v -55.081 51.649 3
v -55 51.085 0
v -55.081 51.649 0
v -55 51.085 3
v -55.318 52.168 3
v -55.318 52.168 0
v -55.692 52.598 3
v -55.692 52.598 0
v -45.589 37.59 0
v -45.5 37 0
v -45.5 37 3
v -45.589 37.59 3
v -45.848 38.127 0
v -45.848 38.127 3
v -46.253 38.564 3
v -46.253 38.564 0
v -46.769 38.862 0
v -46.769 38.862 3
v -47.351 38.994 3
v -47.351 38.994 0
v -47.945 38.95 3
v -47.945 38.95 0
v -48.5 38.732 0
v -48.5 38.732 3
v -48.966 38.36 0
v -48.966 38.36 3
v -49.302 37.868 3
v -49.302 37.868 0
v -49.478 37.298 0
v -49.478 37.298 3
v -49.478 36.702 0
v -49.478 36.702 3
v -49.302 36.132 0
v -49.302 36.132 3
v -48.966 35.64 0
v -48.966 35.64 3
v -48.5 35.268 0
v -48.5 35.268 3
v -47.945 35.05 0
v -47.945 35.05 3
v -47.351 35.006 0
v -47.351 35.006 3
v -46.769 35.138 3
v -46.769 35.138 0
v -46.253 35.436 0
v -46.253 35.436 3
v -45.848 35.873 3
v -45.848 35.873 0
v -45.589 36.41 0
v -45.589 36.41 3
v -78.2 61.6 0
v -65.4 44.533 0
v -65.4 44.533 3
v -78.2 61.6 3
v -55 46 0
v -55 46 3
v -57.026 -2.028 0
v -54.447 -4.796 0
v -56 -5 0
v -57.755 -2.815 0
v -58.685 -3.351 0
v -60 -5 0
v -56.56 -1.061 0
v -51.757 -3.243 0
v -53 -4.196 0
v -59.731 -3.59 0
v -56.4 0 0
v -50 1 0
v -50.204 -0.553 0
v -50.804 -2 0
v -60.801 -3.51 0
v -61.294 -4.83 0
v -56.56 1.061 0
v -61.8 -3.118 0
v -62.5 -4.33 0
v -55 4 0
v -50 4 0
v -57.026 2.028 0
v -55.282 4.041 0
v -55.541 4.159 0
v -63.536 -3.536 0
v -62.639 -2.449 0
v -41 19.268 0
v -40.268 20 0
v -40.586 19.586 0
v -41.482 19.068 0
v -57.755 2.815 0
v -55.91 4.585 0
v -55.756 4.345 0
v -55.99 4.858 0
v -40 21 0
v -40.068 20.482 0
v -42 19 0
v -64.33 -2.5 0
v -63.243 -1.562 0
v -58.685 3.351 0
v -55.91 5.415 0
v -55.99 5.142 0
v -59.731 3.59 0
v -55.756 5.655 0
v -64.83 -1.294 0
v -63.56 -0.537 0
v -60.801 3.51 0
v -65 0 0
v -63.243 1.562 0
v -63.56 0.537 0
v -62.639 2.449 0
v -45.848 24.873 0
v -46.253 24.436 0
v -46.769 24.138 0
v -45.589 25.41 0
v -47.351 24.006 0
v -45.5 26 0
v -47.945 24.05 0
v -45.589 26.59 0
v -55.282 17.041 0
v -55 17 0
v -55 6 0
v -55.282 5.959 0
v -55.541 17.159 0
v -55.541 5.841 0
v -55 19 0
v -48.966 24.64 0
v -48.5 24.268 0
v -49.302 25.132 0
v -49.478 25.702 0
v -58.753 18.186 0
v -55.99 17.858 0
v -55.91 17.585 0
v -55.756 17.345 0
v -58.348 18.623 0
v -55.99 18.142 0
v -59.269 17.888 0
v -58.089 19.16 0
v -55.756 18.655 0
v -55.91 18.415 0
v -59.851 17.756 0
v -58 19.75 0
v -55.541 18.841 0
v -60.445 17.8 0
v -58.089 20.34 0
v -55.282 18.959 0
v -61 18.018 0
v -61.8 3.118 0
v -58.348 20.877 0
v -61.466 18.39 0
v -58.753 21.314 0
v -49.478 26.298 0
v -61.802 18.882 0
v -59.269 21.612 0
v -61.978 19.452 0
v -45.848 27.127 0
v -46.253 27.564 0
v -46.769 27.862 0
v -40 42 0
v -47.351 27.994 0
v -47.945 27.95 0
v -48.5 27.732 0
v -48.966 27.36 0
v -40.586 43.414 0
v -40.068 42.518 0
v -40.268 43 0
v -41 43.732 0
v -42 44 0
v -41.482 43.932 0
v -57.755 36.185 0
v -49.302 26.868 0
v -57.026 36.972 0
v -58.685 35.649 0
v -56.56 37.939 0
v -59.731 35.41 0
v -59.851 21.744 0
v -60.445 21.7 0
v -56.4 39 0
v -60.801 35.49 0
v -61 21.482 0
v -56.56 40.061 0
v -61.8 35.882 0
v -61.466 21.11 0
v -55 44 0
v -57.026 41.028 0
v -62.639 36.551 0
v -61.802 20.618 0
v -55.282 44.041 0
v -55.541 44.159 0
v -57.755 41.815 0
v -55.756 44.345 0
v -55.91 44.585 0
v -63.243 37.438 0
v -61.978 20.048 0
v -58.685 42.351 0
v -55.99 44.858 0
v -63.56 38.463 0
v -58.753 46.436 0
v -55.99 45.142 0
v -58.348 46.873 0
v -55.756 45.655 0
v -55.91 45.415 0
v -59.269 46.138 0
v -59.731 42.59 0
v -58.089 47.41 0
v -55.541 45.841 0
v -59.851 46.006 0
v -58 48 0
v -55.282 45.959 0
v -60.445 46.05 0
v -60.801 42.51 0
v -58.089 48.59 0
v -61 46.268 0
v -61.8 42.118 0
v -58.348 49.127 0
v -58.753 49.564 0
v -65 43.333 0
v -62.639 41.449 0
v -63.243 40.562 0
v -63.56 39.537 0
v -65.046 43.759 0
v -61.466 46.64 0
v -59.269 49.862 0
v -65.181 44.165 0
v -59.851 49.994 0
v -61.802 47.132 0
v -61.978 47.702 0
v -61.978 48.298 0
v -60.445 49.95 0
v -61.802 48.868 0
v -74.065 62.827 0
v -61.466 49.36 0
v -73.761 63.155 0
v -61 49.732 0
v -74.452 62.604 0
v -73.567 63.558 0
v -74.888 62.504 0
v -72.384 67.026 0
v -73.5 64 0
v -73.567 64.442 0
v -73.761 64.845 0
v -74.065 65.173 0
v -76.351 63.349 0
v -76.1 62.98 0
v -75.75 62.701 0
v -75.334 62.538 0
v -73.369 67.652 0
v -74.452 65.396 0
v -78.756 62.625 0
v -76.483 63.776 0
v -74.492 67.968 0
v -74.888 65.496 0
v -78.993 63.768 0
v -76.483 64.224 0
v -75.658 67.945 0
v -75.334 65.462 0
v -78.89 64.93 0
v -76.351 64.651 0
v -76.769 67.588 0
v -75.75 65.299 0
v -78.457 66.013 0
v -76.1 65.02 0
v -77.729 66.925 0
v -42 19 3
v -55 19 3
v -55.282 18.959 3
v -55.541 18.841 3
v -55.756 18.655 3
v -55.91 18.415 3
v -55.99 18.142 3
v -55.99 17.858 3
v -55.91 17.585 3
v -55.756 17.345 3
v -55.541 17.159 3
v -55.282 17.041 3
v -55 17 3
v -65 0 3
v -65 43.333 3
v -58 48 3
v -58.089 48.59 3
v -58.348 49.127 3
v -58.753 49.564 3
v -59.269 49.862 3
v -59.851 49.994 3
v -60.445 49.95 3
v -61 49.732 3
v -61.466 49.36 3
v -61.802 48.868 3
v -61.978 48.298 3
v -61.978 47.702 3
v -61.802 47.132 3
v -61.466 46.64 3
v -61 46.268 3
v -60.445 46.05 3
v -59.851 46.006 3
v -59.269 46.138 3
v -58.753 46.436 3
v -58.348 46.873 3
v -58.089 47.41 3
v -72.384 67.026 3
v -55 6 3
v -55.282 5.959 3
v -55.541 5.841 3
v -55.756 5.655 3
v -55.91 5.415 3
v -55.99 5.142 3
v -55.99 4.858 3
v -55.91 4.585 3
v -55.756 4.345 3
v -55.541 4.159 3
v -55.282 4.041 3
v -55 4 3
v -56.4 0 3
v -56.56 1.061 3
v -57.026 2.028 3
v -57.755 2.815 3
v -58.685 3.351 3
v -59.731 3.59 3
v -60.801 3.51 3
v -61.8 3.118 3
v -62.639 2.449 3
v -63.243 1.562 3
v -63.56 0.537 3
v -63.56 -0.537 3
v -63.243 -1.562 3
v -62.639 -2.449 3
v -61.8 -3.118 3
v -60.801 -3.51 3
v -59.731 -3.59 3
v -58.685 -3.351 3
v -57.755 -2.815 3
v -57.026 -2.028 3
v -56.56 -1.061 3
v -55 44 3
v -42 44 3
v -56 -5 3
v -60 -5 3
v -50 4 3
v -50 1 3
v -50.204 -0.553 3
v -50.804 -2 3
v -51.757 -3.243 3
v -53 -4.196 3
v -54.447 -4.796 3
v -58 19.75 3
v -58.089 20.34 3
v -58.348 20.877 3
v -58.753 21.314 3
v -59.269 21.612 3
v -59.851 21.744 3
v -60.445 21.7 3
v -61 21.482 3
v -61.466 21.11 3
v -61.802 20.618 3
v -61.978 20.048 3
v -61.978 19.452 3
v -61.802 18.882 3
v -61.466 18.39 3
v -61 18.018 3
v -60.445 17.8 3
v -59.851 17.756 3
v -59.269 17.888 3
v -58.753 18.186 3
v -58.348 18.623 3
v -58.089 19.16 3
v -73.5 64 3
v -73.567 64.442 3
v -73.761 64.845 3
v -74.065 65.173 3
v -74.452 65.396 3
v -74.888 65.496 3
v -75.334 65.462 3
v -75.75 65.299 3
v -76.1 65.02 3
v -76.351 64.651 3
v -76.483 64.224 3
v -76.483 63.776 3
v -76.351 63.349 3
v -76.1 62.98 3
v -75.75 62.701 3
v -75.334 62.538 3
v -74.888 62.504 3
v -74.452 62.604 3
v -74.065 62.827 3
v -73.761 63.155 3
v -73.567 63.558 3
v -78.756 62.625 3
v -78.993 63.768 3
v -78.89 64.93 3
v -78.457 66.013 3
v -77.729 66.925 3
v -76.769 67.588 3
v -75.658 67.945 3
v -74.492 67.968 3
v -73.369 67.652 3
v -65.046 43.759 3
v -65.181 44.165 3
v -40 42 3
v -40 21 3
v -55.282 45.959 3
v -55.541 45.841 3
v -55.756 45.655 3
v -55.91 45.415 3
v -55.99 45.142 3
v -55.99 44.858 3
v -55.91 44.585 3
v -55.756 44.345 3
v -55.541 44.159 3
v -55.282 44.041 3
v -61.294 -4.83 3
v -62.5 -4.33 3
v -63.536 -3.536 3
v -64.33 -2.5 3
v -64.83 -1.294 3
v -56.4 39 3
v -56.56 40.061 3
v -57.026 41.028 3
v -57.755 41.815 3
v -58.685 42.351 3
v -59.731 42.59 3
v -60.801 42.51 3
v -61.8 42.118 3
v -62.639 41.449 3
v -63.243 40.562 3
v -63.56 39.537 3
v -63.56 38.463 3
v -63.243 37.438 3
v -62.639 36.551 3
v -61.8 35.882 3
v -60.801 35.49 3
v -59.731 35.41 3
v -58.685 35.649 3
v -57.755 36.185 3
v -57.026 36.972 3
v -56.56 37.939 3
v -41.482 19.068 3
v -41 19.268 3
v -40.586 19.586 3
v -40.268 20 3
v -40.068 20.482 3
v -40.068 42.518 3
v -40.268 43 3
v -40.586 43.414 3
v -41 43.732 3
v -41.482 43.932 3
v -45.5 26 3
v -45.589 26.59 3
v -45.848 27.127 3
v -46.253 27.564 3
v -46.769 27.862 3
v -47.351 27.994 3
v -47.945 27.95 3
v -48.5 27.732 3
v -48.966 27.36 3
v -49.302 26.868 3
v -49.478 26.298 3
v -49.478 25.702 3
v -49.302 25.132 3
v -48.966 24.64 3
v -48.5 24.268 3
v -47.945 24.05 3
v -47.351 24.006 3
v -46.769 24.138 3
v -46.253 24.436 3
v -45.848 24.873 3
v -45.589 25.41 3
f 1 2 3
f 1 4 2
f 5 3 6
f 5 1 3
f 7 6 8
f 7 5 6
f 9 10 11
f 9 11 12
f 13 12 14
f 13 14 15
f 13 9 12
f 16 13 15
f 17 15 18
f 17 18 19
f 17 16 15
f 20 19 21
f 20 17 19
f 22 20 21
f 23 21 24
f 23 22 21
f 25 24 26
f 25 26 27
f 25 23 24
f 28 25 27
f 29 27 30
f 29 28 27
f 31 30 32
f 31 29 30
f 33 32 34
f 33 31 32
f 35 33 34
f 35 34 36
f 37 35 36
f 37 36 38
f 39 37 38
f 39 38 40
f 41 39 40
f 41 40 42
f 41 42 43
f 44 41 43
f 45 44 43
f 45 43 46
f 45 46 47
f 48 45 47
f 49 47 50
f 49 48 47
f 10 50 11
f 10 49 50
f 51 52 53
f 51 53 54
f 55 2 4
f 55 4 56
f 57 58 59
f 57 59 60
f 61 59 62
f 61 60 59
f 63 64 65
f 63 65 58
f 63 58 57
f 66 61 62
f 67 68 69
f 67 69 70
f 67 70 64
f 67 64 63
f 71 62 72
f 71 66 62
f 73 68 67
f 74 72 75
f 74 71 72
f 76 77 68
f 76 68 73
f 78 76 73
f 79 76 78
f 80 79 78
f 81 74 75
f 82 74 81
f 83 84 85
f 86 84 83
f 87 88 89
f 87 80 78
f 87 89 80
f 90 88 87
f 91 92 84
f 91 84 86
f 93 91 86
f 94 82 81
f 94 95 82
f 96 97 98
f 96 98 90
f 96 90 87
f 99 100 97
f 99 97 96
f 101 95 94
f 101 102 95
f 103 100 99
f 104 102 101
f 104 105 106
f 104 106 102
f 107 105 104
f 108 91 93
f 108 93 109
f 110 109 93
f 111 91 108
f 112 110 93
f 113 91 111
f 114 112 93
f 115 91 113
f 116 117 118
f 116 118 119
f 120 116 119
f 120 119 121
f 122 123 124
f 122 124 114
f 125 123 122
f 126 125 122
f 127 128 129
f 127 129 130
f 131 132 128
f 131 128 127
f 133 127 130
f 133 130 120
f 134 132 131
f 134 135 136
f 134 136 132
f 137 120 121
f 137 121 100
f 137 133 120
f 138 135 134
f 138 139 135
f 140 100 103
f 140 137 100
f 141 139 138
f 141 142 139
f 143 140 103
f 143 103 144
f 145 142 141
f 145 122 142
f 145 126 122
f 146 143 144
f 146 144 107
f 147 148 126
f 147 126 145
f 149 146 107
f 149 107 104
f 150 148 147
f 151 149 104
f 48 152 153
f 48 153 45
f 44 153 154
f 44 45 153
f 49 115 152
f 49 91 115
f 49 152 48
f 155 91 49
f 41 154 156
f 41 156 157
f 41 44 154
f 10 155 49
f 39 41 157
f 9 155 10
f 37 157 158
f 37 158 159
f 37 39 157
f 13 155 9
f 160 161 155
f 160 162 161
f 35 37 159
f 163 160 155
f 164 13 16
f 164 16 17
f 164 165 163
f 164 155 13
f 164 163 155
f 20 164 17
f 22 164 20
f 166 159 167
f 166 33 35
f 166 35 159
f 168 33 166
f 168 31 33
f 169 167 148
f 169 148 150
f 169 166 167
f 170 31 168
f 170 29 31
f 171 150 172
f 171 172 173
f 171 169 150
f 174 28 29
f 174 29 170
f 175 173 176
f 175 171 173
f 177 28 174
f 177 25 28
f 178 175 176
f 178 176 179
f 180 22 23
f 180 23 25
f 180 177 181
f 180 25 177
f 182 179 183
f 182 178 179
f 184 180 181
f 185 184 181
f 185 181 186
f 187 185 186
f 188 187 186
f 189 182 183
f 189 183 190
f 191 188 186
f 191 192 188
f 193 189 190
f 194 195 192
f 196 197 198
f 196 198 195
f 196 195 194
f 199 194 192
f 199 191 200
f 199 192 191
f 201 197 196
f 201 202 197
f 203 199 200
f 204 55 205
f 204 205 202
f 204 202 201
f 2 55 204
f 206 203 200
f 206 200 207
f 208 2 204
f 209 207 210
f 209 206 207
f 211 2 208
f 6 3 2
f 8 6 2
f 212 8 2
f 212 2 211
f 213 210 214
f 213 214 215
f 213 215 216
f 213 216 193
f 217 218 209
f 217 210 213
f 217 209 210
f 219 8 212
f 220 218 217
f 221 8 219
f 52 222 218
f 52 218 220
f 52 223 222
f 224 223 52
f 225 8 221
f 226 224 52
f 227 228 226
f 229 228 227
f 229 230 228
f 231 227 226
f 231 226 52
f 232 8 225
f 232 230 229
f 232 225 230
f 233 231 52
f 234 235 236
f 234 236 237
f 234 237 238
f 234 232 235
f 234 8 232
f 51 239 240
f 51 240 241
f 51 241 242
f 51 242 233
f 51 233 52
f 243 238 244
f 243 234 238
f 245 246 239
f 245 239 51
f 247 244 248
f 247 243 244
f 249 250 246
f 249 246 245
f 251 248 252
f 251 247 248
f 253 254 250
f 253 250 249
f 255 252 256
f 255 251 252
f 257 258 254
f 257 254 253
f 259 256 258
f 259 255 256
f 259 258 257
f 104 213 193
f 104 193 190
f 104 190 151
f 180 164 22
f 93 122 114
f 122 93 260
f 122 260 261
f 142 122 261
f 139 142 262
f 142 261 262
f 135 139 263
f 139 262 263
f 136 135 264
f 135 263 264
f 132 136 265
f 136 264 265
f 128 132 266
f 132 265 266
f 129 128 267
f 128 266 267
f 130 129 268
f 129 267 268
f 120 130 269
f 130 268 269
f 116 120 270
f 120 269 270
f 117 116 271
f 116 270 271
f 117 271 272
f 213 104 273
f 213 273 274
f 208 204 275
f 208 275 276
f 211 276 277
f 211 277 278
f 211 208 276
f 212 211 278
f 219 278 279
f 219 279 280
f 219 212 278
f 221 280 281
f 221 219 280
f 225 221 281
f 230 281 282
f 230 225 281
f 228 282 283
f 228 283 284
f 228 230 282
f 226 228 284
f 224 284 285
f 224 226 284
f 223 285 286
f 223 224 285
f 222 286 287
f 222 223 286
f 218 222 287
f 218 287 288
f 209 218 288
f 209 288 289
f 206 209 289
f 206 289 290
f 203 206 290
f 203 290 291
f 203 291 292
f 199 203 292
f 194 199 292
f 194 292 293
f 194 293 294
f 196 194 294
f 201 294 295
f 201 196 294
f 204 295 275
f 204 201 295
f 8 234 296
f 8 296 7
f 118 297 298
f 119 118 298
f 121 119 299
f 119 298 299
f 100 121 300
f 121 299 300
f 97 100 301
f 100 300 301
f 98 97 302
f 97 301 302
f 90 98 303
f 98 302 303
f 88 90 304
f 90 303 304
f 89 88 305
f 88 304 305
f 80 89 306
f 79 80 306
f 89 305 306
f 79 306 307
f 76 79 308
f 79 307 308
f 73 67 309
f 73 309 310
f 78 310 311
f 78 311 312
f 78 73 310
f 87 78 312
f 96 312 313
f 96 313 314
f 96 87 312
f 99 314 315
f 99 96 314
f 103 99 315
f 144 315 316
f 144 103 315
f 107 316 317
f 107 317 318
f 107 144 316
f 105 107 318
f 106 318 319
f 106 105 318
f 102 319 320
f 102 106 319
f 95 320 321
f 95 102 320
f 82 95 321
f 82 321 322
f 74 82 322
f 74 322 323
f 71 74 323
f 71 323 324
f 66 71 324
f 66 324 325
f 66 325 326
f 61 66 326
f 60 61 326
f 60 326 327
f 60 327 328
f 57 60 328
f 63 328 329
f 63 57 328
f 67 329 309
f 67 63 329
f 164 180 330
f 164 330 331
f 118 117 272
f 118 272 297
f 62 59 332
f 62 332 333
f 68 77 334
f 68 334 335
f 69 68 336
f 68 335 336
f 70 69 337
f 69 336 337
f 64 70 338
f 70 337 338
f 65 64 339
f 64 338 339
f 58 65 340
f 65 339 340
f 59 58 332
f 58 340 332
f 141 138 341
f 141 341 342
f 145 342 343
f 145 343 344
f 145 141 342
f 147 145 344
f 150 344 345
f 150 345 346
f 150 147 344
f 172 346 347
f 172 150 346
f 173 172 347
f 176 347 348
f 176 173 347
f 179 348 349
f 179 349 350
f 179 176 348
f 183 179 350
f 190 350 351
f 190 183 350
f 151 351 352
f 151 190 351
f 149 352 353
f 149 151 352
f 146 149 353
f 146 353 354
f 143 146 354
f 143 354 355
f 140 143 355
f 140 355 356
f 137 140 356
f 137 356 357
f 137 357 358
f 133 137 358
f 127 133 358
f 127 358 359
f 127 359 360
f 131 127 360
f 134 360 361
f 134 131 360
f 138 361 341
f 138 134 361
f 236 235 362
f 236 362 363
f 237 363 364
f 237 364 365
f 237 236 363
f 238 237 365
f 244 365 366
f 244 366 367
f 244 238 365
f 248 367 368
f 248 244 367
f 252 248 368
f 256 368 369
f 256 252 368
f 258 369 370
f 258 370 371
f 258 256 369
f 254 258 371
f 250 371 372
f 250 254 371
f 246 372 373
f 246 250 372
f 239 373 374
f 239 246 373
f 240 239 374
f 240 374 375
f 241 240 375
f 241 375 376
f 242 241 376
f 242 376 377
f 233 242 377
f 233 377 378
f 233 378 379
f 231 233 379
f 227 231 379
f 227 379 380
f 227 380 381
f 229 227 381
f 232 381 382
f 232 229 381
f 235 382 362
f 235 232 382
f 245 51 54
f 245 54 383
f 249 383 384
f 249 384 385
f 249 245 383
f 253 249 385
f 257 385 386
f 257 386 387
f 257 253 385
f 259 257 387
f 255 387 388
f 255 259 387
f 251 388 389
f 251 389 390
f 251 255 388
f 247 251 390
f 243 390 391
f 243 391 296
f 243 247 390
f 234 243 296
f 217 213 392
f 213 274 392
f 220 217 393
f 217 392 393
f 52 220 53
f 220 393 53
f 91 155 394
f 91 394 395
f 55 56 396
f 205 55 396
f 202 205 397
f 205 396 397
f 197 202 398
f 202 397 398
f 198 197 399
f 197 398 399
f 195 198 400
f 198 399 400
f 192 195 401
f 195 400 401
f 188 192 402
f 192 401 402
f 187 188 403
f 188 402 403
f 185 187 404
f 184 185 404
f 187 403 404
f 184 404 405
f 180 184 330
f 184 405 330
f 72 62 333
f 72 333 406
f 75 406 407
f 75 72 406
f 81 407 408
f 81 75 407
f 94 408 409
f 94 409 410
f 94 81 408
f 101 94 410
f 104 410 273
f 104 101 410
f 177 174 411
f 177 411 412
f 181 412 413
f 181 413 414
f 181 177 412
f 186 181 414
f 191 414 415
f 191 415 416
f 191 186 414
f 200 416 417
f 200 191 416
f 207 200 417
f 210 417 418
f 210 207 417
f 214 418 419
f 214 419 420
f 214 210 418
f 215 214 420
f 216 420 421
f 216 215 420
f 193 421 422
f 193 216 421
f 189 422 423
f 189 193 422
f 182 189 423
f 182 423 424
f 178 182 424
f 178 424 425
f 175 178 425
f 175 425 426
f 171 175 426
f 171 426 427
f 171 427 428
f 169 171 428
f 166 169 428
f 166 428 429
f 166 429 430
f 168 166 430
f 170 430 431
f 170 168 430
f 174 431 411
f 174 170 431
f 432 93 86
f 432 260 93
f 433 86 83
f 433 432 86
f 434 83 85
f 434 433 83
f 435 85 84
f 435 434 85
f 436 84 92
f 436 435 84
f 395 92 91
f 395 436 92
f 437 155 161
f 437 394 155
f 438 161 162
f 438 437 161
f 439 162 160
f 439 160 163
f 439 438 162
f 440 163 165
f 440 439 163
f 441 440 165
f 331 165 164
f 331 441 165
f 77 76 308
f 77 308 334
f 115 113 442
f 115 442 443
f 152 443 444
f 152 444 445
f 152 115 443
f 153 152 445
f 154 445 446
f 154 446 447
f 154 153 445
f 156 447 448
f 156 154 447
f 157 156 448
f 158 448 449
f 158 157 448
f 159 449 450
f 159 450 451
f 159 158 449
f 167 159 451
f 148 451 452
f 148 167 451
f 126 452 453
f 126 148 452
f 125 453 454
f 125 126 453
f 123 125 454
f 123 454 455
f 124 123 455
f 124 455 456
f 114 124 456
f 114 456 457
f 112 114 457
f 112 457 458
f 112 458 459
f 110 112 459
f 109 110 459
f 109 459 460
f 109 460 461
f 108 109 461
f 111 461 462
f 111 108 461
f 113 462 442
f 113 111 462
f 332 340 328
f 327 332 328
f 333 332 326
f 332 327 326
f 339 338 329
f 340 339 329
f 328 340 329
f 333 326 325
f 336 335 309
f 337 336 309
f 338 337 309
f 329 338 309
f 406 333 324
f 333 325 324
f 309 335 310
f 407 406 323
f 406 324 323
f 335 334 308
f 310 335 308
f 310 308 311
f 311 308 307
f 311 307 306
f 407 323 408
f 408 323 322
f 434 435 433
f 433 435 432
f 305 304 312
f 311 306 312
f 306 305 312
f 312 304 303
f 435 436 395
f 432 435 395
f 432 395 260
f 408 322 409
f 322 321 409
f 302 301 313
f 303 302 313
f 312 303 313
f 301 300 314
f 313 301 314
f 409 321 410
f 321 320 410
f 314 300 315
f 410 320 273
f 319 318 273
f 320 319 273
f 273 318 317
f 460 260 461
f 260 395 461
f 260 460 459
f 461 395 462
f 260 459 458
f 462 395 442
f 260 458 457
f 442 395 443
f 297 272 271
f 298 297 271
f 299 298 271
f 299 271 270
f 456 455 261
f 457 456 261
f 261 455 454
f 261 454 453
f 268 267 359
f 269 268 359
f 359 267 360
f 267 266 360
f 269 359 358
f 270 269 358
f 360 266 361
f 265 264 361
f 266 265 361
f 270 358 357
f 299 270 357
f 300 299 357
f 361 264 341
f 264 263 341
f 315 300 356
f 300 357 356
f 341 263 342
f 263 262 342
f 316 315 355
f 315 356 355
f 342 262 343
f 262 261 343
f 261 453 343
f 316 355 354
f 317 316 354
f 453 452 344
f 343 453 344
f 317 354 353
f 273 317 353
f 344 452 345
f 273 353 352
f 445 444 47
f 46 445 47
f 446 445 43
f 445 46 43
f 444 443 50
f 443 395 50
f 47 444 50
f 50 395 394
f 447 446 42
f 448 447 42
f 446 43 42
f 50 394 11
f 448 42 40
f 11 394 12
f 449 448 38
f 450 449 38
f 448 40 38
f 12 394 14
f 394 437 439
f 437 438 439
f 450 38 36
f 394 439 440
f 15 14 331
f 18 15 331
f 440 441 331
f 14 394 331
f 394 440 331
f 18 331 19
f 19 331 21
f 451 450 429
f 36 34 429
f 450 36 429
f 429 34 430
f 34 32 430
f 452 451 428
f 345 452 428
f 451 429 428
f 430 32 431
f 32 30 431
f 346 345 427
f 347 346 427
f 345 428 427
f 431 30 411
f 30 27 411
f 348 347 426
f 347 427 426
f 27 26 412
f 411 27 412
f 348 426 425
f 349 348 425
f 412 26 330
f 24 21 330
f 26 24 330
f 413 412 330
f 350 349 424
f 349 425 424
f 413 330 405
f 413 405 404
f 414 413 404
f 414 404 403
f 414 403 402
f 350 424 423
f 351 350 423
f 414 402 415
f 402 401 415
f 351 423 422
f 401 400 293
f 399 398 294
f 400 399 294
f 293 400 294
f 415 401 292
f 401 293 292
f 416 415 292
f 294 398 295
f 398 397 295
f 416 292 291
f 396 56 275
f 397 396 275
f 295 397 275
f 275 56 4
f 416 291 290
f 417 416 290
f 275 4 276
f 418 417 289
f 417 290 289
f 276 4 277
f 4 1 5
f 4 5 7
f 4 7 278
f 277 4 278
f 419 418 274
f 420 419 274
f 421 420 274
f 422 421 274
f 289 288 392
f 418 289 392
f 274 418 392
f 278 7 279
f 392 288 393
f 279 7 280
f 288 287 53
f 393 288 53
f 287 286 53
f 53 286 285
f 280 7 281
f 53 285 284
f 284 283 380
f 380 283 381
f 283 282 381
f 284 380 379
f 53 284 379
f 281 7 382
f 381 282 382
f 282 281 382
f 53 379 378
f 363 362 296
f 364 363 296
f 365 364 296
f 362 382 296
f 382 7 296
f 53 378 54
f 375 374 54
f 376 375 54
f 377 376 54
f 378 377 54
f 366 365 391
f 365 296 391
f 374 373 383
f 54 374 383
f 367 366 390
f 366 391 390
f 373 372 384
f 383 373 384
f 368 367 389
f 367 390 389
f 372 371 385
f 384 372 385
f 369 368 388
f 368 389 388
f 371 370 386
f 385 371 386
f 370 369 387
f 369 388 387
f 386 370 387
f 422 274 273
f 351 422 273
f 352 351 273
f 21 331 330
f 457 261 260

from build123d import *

# Parameters (mm, degrees)
SKETCH_2_R          = 3.6
SKETCH_2_R_2        = 1.5
SKETCH_2_R_3        = 2
EXTRUDE_1_DEPTH     = 3
SKETCH_8_R          = 1
CUT_EXTRUDE_1_DEPTH = 105.27847333
FILLET_1_R          = 2
FILLET_2_R          = 6


with BuildPart() as part:
    # 草图2 → 凸台-拉伸1 (new body)
    with BuildSketch(Plane.XY):
        with BuildLine():
            Line((-65, 0), (-65, 44))
            Line((-65, 44), (-78.2, 61.6))
            ThreePointArc((-78.2, 61.6), (-77.728789328, 66.924672427), (-72.384272007, 67.026213321))
            Line((-72.384272007, 67.026213321), (-55, 52))
            Line((-55, 52), (-55, 44))
            Line((-55, 44), (-40, 44))
            Line((-40, 44), (-40, 19))
            Line((-40, 19), (-55, 19))
            Line((-55, 19), (-55, 4))
            Line((-55, 4), (-50, 4))
            Line((-50, 4), (-50, -5))
            Line((-50, -5), (-60, -5))
            ThreePointArc((-60, -5), (-63.535533906, -3.535533906), (-65, 0))
        make_face()
        with Locations((-60, 39)):
            Circle(SKETCH_2_R, mode=Mode.SUBTRACT)
        with Locations((-60, 0)):
            Circle(SKETCH_2_R, mode=Mode.SUBTRACT)
        with Locations((-75, 64)):
            Circle(SKETCH_2_R_2, mode=Mode.SUBTRACT)
        with Locations((-60, 19.75)):
            Circle(SKETCH_2_R_3, mode=Mode.SUBTRACT)
        with Locations((-60, 48)):
            Circle(SKETCH_2_R_3, mode=Mode.SUBTRACT)
        with Locations((-47.5, 37)):
            Circle(SKETCH_2_R_3, mode=Mode.SUBTRACT)
        with Locations((-47.5, 26)):
            Circle(SKETCH_2_R_3, mode=Mode.SUBTRACT)
    extrude(amount=EXTRUDE_1_DEPTH)

    # 草图8 → 切除-拉伸1 (cut, through all)
    with BuildSketch(Plane.XY.offset(3)):
        with Locations((-55, 45)):
            Circle(SKETCH_8_R)
        with Locations((-55, 18)):
            Circle(SKETCH_8_R)
        with Locations((-55, 5)):
            Circle(SKETCH_8_R)
    extrude(amount=-CUT_EXTRUDE_1_DEPTH, mode=Mode.SUBTRACT)

    # 圆角1
    fillet_1_edges = [part.edges().sort_by_distance(p)[0] for p in [
        (-55, 52, 1.5),
        (-40, 44, 1.5),
        (-40, 19, 1.5),
        (-65, 44, 1.5),
    ]]
    fillet(fillet_1_edges, radius=FILLET_1_R)

    # 圆角2
    fillet_2_edges = [part.edges().sort_by_distance(p)[0] for p in [
        (-50, -5, 1.5),
    ]]
    fillet(fillet_2_edges, radius=FILLET_2_R)


solid = part.part
